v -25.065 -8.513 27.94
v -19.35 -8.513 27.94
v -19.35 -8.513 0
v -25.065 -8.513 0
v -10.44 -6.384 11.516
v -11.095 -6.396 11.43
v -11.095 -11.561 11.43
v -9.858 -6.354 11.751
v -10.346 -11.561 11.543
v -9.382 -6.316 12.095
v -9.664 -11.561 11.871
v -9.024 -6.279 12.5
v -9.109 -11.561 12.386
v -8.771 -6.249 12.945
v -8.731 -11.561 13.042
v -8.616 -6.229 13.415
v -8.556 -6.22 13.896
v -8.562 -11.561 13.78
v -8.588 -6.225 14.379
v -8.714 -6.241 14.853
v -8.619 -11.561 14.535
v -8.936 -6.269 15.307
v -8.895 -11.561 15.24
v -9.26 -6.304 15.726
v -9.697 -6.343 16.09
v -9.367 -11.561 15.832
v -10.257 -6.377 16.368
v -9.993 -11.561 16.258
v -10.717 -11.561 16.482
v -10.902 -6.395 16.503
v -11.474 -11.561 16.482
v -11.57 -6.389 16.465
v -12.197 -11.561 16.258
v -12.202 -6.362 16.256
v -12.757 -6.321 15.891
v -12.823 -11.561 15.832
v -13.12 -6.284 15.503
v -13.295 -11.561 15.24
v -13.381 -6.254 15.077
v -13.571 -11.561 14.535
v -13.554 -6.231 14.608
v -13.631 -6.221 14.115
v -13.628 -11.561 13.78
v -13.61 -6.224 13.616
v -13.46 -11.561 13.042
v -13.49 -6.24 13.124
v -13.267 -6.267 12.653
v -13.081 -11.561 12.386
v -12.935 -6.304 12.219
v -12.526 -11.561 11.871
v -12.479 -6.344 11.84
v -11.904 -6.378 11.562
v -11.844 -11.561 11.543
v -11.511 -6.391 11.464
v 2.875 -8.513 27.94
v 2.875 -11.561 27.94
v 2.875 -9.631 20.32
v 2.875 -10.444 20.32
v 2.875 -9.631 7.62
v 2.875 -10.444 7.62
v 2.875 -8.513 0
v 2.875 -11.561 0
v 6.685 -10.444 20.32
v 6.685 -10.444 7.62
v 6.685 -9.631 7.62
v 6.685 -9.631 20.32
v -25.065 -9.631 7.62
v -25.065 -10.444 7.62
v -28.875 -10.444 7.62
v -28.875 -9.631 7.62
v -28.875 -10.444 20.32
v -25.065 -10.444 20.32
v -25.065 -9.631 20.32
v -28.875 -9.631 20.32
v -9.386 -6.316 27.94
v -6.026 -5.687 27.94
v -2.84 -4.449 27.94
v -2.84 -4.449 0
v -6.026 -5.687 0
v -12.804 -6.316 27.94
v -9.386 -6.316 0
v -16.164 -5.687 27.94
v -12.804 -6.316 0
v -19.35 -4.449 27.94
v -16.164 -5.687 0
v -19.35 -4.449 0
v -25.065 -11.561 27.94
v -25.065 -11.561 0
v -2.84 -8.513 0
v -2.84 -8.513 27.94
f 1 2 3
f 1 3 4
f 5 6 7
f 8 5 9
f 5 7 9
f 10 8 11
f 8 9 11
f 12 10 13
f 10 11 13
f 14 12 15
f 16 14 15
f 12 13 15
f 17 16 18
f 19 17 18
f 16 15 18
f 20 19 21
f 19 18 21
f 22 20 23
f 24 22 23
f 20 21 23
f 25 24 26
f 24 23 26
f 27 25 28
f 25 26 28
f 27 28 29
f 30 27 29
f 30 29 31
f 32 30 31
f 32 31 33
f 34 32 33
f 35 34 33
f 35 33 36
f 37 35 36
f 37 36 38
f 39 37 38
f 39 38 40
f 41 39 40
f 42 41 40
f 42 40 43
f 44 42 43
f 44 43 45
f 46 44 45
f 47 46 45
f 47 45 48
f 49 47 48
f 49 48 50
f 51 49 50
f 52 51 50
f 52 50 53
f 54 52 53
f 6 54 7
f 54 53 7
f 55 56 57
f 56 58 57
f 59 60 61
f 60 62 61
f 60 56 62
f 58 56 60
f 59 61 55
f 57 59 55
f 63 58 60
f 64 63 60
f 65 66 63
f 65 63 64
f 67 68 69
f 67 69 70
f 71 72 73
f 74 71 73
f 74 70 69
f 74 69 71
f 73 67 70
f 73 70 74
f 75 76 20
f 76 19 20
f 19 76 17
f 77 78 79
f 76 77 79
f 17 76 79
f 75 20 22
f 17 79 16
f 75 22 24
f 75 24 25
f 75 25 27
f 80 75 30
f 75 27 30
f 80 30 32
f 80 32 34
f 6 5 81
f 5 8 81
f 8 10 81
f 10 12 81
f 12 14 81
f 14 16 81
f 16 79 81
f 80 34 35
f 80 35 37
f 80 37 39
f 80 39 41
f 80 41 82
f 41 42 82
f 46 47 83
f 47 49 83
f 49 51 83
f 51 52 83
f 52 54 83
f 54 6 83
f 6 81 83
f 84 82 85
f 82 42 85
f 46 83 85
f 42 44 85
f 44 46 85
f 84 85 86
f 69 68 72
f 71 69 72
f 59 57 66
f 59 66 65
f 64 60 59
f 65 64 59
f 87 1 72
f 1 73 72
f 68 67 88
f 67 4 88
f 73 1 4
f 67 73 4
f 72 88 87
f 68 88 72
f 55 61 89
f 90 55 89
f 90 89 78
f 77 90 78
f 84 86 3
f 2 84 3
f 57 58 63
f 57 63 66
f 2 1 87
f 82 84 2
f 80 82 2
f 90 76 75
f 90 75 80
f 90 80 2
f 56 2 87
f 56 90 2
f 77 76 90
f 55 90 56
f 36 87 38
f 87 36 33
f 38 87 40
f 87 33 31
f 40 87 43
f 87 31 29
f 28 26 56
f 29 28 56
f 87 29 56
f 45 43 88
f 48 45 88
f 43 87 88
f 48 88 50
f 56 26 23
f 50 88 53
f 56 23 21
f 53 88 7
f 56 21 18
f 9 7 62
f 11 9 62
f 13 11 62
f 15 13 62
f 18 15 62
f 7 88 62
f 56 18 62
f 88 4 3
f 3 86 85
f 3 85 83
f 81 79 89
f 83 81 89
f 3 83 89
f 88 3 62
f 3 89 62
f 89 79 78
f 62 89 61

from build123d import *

# Parameters (mm, degrees)
BOSS_EXTRUDE1_DEPTH     = 27.94
CUT_EXTRUDE1_REACH      = 40.203
CUT_EXTRUDE1_END_RADIUS = 18.480456736
SKETCH2_R               = 2.54
SKETCH3_W               = 12.7
SKETCH3_H               = 0.8128
BOSS_EXTRUDE2_DEPTH     = 3.81
SKETCH4_W               = 12.7
SKETCH4_H               = 0.8128
BOSS_EXTRUDE3_DEPTH     = 3.81


with BuildPart() as part:
    # Sketch1 → Boss-Extrude1 (new body)
    with BuildSketch(Plane.XY):
        with BuildLine():
            Line((-25.065129767, -11.56137931), (2.874870233, -11.56137931))
            Line((2.874870233, -11.56137931), (2.874870233, -8.51337931))
            Line((2.874870233, -8.51337931), (-2.840129767, -8.51337931))
            Line((-2.840129767, -8.51337931), (-2.840129767, -4.44937931))
            ThreePointArc((-2.840129767, -4.44937931), (-11.095129767, -6.395560853), (-19.350129767, -4.44937931))
            Line((-19.350129767, -4.44937931), (-19.350129767, -8.51337931))
            Line((-19.350129767, -8.51337931), (-25.065129767, -8.51337931))
            Line((-25.065129767, -8.51337931), (-25.065129767, -11.56137931))
        make_face()
    extrude(amount=BOSS_EXTRUDE1_DEPTH)

    # Cut-Extrude1: up to this cylinder (the profile starts outside it)
    cut_extrude1_end = Plane(origin=(-11.095129767, 12.084895883, 13.97), z_dir=(0, 0, -1)) * Cylinder(CUT_EXTRUDE1_END_RADIUS, 118.366913471, mode=Mode.PRIVATE)
    # Sketch2 → Cut-Extrude1 (cut, up to the surface)
    with BuildSketch(Plane.XZ.offset(11.56137931), mode=Mode.PRIVATE) as cut_extrude1_sk1:
        with Locations(Location((-11.095129767, 13.97, 0), (0, 0, 270))):
            Circle(SKETCH2_R)
    cut_extrude1_tool1 = extrude(cut_extrude1_sk1.sketch, amount=-CUT_EXTRUDE1_REACH, mode=Mode.PRIVATE) - cut_extrude1_end
    add(cut_extrude1_tool1.solids().sort_by_distance((-11.09513, -11.561379, 13.97))[0], mode=Mode.SUBTRACT)

    # Sketch3 → Boss-Extrude2 (add)
    with BuildSketch(Plane(origin=(2.874870233, 0, 0), x_dir=(0, 0, -1), z_dir=(1, 0, 0))):
        with Locations((-13.97, -10.03737931)):
            Rectangle(SKETCH3_W, SKETCH3_H)
    extrude(amount=BOSS_EXTRUDE2_DEPTH)

    # Sketch4 → Boss-Extrude3 (add)
    with BuildSketch(Plane.ZY.offset(25.065129767)):
        with Locations((13.97, -10.03737931)):
            Rectangle(SKETCH4_W, SKETCH4_H)
    extrude(amount=BOSS_EXTRUDE3_DEPTH)


solid = part.part
